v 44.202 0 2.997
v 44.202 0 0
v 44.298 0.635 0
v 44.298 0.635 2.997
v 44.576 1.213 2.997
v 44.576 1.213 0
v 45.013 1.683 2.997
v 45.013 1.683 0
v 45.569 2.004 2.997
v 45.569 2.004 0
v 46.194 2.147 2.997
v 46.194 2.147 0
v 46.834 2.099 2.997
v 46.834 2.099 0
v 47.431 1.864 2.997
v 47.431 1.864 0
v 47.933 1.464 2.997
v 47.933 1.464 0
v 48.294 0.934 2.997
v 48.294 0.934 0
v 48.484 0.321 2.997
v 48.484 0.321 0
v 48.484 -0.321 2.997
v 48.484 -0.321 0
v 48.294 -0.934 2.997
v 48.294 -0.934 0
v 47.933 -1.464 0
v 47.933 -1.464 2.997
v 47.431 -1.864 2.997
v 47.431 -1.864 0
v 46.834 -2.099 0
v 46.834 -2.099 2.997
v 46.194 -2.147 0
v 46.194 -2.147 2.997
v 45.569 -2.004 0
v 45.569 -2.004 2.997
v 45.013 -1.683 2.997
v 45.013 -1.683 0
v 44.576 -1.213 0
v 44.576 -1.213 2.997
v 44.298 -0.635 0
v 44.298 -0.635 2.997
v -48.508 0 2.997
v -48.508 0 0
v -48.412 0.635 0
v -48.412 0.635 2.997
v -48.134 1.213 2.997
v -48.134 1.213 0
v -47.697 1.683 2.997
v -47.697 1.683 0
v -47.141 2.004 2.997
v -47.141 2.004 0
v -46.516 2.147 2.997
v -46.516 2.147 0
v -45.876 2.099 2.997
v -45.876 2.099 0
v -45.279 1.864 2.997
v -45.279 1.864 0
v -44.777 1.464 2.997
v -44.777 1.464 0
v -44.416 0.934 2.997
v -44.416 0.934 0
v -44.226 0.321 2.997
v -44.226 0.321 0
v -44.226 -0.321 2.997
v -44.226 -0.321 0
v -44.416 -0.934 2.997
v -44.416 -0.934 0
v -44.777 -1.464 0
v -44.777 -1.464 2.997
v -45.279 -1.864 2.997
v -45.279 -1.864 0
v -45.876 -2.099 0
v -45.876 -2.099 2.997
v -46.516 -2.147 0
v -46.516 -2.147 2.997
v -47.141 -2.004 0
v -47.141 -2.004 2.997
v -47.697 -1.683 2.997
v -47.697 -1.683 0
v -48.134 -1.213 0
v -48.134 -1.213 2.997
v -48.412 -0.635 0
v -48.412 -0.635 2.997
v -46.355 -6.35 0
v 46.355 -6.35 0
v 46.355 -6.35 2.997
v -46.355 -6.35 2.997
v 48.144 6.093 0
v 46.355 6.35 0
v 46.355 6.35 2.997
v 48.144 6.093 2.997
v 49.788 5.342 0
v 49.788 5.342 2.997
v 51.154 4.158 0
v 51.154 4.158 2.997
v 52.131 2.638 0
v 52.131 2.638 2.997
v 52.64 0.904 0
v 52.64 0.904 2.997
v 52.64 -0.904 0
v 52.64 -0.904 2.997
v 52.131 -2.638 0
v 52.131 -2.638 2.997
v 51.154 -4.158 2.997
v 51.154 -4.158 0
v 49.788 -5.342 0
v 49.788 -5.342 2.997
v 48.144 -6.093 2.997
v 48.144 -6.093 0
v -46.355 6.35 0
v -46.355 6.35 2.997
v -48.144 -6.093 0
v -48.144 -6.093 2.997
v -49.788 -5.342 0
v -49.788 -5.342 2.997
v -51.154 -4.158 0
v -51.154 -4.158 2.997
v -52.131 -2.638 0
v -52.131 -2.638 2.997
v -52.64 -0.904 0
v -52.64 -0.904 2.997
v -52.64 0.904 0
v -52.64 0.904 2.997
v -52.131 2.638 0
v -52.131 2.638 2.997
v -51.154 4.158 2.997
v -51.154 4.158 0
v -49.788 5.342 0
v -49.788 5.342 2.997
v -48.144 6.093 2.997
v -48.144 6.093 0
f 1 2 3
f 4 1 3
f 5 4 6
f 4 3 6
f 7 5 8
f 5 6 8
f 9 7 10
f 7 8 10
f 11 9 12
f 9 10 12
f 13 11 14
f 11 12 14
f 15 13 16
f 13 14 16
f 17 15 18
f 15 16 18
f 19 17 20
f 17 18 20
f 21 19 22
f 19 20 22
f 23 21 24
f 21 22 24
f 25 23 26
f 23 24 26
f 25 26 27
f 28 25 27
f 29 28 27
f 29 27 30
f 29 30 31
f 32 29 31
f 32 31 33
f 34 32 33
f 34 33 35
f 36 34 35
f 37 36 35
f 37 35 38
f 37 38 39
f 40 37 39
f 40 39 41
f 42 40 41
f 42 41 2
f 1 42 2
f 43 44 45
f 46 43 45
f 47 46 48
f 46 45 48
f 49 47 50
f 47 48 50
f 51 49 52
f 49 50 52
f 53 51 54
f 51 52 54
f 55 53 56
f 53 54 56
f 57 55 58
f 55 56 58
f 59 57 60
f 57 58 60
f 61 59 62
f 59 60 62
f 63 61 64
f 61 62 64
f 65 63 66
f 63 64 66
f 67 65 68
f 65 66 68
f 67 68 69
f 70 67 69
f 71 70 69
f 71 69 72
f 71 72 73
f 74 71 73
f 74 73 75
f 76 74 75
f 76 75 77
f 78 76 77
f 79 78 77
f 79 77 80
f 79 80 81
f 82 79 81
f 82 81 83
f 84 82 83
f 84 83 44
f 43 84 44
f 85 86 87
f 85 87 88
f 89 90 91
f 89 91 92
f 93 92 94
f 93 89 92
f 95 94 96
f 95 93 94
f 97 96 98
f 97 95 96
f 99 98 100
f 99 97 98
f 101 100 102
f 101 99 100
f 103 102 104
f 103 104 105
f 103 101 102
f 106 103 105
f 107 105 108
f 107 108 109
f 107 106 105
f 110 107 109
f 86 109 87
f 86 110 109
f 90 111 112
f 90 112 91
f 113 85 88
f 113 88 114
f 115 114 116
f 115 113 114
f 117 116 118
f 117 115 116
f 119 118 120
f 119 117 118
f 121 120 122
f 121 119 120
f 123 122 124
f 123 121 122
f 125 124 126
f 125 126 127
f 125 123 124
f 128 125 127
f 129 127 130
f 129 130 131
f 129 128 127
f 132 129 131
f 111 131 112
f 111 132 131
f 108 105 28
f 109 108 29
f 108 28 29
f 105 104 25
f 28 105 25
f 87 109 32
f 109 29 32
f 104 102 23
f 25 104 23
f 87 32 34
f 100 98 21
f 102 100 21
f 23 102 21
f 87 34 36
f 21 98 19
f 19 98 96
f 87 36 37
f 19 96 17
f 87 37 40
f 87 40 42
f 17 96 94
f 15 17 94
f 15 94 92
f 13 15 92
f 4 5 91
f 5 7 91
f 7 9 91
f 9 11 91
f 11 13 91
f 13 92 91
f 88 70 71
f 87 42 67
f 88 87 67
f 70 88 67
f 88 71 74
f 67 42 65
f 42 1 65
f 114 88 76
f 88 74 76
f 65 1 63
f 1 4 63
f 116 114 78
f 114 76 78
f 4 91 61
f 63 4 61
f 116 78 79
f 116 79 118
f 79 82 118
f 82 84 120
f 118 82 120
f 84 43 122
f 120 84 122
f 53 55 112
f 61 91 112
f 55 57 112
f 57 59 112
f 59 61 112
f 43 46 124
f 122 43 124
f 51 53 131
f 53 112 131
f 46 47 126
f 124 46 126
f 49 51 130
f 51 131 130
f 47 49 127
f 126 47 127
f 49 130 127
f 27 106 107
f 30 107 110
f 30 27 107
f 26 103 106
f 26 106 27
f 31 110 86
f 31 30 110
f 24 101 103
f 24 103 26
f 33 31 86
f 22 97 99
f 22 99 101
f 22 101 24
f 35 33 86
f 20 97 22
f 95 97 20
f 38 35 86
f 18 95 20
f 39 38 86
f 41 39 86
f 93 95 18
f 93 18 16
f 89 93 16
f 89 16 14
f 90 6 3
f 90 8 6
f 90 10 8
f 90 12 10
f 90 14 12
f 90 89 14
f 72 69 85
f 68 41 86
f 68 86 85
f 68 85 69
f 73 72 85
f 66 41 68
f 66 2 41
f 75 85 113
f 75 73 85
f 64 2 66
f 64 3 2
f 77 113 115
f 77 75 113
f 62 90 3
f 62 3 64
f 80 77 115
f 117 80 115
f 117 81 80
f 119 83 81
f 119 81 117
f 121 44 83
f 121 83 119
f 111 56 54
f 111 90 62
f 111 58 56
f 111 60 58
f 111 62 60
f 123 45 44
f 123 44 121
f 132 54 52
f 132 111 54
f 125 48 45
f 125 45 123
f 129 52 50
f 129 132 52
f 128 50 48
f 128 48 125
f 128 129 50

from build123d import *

# Parameters (mm, degrees)
BOSS_EXTRUDE1_DEPTH       = 2.9972
F_8_CLEARANCE_HOLE1_D     = 4.3053
F_8_CLEARANCE_HOLE1_DEPTH = 6.351016


with BuildPart() as part:
    # Sketch1 → Boss-Extrude1 (new body)
    with BuildSketch(Plane.XY):
        with BuildLine():
            Line((-46.355, 6.35), (46.355, 6.35))
            ThreePointArc((46.355, 6.35), (52.705, 0), (46.355, -6.35))
            Line((46.355, -6.35), (-46.355, -6.35))
            ThreePointArc((-46.355, -6.35), (-52.705, 0), (-46.355, 6.35))
        make_face()
    extrude(amount=BOSS_EXTRUDE1_DEPTH)

    # #8 Clearance Hole1
    with Locations(Plane.XY.offset(2.9972)):
        with Locations((-46.355, 0), (46.355, 0)):
            Hole(F_8_CLEARANCE_HOLE1_D / 2, depth=F_8_CLEARANCE_HOLE1_DEPTH)


solid = part.part
